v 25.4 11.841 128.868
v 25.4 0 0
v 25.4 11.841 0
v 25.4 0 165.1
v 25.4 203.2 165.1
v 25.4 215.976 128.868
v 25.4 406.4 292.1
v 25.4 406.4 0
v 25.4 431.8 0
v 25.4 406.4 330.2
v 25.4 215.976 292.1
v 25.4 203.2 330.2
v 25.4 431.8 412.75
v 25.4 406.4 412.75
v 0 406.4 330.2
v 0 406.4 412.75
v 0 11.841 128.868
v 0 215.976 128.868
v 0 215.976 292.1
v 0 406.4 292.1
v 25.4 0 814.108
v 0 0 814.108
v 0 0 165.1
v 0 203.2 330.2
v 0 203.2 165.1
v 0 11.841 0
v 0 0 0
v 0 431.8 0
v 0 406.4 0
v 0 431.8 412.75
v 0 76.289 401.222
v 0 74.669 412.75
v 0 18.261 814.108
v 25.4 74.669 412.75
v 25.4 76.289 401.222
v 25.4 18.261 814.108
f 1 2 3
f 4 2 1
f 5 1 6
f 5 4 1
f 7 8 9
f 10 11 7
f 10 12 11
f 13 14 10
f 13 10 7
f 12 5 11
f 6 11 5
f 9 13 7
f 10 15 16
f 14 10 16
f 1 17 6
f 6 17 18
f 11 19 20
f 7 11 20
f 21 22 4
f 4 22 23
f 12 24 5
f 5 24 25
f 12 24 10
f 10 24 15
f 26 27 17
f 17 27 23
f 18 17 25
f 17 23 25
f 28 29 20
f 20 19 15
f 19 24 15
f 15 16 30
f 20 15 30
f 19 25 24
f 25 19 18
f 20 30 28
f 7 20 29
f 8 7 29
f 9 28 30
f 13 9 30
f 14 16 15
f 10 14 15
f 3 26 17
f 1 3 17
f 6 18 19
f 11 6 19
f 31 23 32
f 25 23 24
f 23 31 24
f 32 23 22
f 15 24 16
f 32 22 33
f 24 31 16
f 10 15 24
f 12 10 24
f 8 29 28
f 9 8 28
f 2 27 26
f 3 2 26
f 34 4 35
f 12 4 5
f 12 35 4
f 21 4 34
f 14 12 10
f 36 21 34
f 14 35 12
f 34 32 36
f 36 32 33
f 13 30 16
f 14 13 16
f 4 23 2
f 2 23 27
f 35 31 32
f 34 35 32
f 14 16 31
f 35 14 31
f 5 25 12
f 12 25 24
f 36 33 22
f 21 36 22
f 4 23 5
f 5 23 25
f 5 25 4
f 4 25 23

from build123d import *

# Parameters (mm, degrees)
F1_DEPTH = 25.4
F2_DEPTH = 25.4


# Not quite as in the source:
# - a feature names something its author has since deleted; it is built from what else it names


with BuildPart() as f1:
    # F0 (on Right) → F1 (new body)
    with BuildSketch(Plane.YZ):
        Polygon((0, 203.2), (0, 165.1), (203.2, 165.1), (203.2, 330.2), (406.4, 330.2), (406.4, 412.75), (76.288649265, 401.2222576144), (74.6685307278, 412.75), (0, 412.75), (0, 330.2), align=None)
        Polygon((0, 814.1079739114), (0, 412.75), (74.6685307278, 412.75), (18.2613460599, 814.1079739114), align=None)
    extrude(amount=F1_DEPTH)


with BuildPart() as f2:
    # F0 (on Right) → F2 (new body)
    with BuildSketch(Plane.YZ):
        Polygon((406.4, 412.75), (406.4, 330.2), (406.4, 292.1), (406.4, 0), (431.8, 0), (431.8, 412.75), align=None)
        Polygon((0, 165.1), (0, 0), (11.8412161246, 0), (11.8412161246, 128.8679540157), (203.2, 128.8679540157), (215.9764766693, 128.8679540157), (215.9764766693, 292.1), (406.4, 292.1), (406.4, 330.2), (203.2, 330.2), (203.2, 165.1), align=None)
    extrude(amount=F2_DEPTH)


solid = Compound([f1.part, f2.part])
